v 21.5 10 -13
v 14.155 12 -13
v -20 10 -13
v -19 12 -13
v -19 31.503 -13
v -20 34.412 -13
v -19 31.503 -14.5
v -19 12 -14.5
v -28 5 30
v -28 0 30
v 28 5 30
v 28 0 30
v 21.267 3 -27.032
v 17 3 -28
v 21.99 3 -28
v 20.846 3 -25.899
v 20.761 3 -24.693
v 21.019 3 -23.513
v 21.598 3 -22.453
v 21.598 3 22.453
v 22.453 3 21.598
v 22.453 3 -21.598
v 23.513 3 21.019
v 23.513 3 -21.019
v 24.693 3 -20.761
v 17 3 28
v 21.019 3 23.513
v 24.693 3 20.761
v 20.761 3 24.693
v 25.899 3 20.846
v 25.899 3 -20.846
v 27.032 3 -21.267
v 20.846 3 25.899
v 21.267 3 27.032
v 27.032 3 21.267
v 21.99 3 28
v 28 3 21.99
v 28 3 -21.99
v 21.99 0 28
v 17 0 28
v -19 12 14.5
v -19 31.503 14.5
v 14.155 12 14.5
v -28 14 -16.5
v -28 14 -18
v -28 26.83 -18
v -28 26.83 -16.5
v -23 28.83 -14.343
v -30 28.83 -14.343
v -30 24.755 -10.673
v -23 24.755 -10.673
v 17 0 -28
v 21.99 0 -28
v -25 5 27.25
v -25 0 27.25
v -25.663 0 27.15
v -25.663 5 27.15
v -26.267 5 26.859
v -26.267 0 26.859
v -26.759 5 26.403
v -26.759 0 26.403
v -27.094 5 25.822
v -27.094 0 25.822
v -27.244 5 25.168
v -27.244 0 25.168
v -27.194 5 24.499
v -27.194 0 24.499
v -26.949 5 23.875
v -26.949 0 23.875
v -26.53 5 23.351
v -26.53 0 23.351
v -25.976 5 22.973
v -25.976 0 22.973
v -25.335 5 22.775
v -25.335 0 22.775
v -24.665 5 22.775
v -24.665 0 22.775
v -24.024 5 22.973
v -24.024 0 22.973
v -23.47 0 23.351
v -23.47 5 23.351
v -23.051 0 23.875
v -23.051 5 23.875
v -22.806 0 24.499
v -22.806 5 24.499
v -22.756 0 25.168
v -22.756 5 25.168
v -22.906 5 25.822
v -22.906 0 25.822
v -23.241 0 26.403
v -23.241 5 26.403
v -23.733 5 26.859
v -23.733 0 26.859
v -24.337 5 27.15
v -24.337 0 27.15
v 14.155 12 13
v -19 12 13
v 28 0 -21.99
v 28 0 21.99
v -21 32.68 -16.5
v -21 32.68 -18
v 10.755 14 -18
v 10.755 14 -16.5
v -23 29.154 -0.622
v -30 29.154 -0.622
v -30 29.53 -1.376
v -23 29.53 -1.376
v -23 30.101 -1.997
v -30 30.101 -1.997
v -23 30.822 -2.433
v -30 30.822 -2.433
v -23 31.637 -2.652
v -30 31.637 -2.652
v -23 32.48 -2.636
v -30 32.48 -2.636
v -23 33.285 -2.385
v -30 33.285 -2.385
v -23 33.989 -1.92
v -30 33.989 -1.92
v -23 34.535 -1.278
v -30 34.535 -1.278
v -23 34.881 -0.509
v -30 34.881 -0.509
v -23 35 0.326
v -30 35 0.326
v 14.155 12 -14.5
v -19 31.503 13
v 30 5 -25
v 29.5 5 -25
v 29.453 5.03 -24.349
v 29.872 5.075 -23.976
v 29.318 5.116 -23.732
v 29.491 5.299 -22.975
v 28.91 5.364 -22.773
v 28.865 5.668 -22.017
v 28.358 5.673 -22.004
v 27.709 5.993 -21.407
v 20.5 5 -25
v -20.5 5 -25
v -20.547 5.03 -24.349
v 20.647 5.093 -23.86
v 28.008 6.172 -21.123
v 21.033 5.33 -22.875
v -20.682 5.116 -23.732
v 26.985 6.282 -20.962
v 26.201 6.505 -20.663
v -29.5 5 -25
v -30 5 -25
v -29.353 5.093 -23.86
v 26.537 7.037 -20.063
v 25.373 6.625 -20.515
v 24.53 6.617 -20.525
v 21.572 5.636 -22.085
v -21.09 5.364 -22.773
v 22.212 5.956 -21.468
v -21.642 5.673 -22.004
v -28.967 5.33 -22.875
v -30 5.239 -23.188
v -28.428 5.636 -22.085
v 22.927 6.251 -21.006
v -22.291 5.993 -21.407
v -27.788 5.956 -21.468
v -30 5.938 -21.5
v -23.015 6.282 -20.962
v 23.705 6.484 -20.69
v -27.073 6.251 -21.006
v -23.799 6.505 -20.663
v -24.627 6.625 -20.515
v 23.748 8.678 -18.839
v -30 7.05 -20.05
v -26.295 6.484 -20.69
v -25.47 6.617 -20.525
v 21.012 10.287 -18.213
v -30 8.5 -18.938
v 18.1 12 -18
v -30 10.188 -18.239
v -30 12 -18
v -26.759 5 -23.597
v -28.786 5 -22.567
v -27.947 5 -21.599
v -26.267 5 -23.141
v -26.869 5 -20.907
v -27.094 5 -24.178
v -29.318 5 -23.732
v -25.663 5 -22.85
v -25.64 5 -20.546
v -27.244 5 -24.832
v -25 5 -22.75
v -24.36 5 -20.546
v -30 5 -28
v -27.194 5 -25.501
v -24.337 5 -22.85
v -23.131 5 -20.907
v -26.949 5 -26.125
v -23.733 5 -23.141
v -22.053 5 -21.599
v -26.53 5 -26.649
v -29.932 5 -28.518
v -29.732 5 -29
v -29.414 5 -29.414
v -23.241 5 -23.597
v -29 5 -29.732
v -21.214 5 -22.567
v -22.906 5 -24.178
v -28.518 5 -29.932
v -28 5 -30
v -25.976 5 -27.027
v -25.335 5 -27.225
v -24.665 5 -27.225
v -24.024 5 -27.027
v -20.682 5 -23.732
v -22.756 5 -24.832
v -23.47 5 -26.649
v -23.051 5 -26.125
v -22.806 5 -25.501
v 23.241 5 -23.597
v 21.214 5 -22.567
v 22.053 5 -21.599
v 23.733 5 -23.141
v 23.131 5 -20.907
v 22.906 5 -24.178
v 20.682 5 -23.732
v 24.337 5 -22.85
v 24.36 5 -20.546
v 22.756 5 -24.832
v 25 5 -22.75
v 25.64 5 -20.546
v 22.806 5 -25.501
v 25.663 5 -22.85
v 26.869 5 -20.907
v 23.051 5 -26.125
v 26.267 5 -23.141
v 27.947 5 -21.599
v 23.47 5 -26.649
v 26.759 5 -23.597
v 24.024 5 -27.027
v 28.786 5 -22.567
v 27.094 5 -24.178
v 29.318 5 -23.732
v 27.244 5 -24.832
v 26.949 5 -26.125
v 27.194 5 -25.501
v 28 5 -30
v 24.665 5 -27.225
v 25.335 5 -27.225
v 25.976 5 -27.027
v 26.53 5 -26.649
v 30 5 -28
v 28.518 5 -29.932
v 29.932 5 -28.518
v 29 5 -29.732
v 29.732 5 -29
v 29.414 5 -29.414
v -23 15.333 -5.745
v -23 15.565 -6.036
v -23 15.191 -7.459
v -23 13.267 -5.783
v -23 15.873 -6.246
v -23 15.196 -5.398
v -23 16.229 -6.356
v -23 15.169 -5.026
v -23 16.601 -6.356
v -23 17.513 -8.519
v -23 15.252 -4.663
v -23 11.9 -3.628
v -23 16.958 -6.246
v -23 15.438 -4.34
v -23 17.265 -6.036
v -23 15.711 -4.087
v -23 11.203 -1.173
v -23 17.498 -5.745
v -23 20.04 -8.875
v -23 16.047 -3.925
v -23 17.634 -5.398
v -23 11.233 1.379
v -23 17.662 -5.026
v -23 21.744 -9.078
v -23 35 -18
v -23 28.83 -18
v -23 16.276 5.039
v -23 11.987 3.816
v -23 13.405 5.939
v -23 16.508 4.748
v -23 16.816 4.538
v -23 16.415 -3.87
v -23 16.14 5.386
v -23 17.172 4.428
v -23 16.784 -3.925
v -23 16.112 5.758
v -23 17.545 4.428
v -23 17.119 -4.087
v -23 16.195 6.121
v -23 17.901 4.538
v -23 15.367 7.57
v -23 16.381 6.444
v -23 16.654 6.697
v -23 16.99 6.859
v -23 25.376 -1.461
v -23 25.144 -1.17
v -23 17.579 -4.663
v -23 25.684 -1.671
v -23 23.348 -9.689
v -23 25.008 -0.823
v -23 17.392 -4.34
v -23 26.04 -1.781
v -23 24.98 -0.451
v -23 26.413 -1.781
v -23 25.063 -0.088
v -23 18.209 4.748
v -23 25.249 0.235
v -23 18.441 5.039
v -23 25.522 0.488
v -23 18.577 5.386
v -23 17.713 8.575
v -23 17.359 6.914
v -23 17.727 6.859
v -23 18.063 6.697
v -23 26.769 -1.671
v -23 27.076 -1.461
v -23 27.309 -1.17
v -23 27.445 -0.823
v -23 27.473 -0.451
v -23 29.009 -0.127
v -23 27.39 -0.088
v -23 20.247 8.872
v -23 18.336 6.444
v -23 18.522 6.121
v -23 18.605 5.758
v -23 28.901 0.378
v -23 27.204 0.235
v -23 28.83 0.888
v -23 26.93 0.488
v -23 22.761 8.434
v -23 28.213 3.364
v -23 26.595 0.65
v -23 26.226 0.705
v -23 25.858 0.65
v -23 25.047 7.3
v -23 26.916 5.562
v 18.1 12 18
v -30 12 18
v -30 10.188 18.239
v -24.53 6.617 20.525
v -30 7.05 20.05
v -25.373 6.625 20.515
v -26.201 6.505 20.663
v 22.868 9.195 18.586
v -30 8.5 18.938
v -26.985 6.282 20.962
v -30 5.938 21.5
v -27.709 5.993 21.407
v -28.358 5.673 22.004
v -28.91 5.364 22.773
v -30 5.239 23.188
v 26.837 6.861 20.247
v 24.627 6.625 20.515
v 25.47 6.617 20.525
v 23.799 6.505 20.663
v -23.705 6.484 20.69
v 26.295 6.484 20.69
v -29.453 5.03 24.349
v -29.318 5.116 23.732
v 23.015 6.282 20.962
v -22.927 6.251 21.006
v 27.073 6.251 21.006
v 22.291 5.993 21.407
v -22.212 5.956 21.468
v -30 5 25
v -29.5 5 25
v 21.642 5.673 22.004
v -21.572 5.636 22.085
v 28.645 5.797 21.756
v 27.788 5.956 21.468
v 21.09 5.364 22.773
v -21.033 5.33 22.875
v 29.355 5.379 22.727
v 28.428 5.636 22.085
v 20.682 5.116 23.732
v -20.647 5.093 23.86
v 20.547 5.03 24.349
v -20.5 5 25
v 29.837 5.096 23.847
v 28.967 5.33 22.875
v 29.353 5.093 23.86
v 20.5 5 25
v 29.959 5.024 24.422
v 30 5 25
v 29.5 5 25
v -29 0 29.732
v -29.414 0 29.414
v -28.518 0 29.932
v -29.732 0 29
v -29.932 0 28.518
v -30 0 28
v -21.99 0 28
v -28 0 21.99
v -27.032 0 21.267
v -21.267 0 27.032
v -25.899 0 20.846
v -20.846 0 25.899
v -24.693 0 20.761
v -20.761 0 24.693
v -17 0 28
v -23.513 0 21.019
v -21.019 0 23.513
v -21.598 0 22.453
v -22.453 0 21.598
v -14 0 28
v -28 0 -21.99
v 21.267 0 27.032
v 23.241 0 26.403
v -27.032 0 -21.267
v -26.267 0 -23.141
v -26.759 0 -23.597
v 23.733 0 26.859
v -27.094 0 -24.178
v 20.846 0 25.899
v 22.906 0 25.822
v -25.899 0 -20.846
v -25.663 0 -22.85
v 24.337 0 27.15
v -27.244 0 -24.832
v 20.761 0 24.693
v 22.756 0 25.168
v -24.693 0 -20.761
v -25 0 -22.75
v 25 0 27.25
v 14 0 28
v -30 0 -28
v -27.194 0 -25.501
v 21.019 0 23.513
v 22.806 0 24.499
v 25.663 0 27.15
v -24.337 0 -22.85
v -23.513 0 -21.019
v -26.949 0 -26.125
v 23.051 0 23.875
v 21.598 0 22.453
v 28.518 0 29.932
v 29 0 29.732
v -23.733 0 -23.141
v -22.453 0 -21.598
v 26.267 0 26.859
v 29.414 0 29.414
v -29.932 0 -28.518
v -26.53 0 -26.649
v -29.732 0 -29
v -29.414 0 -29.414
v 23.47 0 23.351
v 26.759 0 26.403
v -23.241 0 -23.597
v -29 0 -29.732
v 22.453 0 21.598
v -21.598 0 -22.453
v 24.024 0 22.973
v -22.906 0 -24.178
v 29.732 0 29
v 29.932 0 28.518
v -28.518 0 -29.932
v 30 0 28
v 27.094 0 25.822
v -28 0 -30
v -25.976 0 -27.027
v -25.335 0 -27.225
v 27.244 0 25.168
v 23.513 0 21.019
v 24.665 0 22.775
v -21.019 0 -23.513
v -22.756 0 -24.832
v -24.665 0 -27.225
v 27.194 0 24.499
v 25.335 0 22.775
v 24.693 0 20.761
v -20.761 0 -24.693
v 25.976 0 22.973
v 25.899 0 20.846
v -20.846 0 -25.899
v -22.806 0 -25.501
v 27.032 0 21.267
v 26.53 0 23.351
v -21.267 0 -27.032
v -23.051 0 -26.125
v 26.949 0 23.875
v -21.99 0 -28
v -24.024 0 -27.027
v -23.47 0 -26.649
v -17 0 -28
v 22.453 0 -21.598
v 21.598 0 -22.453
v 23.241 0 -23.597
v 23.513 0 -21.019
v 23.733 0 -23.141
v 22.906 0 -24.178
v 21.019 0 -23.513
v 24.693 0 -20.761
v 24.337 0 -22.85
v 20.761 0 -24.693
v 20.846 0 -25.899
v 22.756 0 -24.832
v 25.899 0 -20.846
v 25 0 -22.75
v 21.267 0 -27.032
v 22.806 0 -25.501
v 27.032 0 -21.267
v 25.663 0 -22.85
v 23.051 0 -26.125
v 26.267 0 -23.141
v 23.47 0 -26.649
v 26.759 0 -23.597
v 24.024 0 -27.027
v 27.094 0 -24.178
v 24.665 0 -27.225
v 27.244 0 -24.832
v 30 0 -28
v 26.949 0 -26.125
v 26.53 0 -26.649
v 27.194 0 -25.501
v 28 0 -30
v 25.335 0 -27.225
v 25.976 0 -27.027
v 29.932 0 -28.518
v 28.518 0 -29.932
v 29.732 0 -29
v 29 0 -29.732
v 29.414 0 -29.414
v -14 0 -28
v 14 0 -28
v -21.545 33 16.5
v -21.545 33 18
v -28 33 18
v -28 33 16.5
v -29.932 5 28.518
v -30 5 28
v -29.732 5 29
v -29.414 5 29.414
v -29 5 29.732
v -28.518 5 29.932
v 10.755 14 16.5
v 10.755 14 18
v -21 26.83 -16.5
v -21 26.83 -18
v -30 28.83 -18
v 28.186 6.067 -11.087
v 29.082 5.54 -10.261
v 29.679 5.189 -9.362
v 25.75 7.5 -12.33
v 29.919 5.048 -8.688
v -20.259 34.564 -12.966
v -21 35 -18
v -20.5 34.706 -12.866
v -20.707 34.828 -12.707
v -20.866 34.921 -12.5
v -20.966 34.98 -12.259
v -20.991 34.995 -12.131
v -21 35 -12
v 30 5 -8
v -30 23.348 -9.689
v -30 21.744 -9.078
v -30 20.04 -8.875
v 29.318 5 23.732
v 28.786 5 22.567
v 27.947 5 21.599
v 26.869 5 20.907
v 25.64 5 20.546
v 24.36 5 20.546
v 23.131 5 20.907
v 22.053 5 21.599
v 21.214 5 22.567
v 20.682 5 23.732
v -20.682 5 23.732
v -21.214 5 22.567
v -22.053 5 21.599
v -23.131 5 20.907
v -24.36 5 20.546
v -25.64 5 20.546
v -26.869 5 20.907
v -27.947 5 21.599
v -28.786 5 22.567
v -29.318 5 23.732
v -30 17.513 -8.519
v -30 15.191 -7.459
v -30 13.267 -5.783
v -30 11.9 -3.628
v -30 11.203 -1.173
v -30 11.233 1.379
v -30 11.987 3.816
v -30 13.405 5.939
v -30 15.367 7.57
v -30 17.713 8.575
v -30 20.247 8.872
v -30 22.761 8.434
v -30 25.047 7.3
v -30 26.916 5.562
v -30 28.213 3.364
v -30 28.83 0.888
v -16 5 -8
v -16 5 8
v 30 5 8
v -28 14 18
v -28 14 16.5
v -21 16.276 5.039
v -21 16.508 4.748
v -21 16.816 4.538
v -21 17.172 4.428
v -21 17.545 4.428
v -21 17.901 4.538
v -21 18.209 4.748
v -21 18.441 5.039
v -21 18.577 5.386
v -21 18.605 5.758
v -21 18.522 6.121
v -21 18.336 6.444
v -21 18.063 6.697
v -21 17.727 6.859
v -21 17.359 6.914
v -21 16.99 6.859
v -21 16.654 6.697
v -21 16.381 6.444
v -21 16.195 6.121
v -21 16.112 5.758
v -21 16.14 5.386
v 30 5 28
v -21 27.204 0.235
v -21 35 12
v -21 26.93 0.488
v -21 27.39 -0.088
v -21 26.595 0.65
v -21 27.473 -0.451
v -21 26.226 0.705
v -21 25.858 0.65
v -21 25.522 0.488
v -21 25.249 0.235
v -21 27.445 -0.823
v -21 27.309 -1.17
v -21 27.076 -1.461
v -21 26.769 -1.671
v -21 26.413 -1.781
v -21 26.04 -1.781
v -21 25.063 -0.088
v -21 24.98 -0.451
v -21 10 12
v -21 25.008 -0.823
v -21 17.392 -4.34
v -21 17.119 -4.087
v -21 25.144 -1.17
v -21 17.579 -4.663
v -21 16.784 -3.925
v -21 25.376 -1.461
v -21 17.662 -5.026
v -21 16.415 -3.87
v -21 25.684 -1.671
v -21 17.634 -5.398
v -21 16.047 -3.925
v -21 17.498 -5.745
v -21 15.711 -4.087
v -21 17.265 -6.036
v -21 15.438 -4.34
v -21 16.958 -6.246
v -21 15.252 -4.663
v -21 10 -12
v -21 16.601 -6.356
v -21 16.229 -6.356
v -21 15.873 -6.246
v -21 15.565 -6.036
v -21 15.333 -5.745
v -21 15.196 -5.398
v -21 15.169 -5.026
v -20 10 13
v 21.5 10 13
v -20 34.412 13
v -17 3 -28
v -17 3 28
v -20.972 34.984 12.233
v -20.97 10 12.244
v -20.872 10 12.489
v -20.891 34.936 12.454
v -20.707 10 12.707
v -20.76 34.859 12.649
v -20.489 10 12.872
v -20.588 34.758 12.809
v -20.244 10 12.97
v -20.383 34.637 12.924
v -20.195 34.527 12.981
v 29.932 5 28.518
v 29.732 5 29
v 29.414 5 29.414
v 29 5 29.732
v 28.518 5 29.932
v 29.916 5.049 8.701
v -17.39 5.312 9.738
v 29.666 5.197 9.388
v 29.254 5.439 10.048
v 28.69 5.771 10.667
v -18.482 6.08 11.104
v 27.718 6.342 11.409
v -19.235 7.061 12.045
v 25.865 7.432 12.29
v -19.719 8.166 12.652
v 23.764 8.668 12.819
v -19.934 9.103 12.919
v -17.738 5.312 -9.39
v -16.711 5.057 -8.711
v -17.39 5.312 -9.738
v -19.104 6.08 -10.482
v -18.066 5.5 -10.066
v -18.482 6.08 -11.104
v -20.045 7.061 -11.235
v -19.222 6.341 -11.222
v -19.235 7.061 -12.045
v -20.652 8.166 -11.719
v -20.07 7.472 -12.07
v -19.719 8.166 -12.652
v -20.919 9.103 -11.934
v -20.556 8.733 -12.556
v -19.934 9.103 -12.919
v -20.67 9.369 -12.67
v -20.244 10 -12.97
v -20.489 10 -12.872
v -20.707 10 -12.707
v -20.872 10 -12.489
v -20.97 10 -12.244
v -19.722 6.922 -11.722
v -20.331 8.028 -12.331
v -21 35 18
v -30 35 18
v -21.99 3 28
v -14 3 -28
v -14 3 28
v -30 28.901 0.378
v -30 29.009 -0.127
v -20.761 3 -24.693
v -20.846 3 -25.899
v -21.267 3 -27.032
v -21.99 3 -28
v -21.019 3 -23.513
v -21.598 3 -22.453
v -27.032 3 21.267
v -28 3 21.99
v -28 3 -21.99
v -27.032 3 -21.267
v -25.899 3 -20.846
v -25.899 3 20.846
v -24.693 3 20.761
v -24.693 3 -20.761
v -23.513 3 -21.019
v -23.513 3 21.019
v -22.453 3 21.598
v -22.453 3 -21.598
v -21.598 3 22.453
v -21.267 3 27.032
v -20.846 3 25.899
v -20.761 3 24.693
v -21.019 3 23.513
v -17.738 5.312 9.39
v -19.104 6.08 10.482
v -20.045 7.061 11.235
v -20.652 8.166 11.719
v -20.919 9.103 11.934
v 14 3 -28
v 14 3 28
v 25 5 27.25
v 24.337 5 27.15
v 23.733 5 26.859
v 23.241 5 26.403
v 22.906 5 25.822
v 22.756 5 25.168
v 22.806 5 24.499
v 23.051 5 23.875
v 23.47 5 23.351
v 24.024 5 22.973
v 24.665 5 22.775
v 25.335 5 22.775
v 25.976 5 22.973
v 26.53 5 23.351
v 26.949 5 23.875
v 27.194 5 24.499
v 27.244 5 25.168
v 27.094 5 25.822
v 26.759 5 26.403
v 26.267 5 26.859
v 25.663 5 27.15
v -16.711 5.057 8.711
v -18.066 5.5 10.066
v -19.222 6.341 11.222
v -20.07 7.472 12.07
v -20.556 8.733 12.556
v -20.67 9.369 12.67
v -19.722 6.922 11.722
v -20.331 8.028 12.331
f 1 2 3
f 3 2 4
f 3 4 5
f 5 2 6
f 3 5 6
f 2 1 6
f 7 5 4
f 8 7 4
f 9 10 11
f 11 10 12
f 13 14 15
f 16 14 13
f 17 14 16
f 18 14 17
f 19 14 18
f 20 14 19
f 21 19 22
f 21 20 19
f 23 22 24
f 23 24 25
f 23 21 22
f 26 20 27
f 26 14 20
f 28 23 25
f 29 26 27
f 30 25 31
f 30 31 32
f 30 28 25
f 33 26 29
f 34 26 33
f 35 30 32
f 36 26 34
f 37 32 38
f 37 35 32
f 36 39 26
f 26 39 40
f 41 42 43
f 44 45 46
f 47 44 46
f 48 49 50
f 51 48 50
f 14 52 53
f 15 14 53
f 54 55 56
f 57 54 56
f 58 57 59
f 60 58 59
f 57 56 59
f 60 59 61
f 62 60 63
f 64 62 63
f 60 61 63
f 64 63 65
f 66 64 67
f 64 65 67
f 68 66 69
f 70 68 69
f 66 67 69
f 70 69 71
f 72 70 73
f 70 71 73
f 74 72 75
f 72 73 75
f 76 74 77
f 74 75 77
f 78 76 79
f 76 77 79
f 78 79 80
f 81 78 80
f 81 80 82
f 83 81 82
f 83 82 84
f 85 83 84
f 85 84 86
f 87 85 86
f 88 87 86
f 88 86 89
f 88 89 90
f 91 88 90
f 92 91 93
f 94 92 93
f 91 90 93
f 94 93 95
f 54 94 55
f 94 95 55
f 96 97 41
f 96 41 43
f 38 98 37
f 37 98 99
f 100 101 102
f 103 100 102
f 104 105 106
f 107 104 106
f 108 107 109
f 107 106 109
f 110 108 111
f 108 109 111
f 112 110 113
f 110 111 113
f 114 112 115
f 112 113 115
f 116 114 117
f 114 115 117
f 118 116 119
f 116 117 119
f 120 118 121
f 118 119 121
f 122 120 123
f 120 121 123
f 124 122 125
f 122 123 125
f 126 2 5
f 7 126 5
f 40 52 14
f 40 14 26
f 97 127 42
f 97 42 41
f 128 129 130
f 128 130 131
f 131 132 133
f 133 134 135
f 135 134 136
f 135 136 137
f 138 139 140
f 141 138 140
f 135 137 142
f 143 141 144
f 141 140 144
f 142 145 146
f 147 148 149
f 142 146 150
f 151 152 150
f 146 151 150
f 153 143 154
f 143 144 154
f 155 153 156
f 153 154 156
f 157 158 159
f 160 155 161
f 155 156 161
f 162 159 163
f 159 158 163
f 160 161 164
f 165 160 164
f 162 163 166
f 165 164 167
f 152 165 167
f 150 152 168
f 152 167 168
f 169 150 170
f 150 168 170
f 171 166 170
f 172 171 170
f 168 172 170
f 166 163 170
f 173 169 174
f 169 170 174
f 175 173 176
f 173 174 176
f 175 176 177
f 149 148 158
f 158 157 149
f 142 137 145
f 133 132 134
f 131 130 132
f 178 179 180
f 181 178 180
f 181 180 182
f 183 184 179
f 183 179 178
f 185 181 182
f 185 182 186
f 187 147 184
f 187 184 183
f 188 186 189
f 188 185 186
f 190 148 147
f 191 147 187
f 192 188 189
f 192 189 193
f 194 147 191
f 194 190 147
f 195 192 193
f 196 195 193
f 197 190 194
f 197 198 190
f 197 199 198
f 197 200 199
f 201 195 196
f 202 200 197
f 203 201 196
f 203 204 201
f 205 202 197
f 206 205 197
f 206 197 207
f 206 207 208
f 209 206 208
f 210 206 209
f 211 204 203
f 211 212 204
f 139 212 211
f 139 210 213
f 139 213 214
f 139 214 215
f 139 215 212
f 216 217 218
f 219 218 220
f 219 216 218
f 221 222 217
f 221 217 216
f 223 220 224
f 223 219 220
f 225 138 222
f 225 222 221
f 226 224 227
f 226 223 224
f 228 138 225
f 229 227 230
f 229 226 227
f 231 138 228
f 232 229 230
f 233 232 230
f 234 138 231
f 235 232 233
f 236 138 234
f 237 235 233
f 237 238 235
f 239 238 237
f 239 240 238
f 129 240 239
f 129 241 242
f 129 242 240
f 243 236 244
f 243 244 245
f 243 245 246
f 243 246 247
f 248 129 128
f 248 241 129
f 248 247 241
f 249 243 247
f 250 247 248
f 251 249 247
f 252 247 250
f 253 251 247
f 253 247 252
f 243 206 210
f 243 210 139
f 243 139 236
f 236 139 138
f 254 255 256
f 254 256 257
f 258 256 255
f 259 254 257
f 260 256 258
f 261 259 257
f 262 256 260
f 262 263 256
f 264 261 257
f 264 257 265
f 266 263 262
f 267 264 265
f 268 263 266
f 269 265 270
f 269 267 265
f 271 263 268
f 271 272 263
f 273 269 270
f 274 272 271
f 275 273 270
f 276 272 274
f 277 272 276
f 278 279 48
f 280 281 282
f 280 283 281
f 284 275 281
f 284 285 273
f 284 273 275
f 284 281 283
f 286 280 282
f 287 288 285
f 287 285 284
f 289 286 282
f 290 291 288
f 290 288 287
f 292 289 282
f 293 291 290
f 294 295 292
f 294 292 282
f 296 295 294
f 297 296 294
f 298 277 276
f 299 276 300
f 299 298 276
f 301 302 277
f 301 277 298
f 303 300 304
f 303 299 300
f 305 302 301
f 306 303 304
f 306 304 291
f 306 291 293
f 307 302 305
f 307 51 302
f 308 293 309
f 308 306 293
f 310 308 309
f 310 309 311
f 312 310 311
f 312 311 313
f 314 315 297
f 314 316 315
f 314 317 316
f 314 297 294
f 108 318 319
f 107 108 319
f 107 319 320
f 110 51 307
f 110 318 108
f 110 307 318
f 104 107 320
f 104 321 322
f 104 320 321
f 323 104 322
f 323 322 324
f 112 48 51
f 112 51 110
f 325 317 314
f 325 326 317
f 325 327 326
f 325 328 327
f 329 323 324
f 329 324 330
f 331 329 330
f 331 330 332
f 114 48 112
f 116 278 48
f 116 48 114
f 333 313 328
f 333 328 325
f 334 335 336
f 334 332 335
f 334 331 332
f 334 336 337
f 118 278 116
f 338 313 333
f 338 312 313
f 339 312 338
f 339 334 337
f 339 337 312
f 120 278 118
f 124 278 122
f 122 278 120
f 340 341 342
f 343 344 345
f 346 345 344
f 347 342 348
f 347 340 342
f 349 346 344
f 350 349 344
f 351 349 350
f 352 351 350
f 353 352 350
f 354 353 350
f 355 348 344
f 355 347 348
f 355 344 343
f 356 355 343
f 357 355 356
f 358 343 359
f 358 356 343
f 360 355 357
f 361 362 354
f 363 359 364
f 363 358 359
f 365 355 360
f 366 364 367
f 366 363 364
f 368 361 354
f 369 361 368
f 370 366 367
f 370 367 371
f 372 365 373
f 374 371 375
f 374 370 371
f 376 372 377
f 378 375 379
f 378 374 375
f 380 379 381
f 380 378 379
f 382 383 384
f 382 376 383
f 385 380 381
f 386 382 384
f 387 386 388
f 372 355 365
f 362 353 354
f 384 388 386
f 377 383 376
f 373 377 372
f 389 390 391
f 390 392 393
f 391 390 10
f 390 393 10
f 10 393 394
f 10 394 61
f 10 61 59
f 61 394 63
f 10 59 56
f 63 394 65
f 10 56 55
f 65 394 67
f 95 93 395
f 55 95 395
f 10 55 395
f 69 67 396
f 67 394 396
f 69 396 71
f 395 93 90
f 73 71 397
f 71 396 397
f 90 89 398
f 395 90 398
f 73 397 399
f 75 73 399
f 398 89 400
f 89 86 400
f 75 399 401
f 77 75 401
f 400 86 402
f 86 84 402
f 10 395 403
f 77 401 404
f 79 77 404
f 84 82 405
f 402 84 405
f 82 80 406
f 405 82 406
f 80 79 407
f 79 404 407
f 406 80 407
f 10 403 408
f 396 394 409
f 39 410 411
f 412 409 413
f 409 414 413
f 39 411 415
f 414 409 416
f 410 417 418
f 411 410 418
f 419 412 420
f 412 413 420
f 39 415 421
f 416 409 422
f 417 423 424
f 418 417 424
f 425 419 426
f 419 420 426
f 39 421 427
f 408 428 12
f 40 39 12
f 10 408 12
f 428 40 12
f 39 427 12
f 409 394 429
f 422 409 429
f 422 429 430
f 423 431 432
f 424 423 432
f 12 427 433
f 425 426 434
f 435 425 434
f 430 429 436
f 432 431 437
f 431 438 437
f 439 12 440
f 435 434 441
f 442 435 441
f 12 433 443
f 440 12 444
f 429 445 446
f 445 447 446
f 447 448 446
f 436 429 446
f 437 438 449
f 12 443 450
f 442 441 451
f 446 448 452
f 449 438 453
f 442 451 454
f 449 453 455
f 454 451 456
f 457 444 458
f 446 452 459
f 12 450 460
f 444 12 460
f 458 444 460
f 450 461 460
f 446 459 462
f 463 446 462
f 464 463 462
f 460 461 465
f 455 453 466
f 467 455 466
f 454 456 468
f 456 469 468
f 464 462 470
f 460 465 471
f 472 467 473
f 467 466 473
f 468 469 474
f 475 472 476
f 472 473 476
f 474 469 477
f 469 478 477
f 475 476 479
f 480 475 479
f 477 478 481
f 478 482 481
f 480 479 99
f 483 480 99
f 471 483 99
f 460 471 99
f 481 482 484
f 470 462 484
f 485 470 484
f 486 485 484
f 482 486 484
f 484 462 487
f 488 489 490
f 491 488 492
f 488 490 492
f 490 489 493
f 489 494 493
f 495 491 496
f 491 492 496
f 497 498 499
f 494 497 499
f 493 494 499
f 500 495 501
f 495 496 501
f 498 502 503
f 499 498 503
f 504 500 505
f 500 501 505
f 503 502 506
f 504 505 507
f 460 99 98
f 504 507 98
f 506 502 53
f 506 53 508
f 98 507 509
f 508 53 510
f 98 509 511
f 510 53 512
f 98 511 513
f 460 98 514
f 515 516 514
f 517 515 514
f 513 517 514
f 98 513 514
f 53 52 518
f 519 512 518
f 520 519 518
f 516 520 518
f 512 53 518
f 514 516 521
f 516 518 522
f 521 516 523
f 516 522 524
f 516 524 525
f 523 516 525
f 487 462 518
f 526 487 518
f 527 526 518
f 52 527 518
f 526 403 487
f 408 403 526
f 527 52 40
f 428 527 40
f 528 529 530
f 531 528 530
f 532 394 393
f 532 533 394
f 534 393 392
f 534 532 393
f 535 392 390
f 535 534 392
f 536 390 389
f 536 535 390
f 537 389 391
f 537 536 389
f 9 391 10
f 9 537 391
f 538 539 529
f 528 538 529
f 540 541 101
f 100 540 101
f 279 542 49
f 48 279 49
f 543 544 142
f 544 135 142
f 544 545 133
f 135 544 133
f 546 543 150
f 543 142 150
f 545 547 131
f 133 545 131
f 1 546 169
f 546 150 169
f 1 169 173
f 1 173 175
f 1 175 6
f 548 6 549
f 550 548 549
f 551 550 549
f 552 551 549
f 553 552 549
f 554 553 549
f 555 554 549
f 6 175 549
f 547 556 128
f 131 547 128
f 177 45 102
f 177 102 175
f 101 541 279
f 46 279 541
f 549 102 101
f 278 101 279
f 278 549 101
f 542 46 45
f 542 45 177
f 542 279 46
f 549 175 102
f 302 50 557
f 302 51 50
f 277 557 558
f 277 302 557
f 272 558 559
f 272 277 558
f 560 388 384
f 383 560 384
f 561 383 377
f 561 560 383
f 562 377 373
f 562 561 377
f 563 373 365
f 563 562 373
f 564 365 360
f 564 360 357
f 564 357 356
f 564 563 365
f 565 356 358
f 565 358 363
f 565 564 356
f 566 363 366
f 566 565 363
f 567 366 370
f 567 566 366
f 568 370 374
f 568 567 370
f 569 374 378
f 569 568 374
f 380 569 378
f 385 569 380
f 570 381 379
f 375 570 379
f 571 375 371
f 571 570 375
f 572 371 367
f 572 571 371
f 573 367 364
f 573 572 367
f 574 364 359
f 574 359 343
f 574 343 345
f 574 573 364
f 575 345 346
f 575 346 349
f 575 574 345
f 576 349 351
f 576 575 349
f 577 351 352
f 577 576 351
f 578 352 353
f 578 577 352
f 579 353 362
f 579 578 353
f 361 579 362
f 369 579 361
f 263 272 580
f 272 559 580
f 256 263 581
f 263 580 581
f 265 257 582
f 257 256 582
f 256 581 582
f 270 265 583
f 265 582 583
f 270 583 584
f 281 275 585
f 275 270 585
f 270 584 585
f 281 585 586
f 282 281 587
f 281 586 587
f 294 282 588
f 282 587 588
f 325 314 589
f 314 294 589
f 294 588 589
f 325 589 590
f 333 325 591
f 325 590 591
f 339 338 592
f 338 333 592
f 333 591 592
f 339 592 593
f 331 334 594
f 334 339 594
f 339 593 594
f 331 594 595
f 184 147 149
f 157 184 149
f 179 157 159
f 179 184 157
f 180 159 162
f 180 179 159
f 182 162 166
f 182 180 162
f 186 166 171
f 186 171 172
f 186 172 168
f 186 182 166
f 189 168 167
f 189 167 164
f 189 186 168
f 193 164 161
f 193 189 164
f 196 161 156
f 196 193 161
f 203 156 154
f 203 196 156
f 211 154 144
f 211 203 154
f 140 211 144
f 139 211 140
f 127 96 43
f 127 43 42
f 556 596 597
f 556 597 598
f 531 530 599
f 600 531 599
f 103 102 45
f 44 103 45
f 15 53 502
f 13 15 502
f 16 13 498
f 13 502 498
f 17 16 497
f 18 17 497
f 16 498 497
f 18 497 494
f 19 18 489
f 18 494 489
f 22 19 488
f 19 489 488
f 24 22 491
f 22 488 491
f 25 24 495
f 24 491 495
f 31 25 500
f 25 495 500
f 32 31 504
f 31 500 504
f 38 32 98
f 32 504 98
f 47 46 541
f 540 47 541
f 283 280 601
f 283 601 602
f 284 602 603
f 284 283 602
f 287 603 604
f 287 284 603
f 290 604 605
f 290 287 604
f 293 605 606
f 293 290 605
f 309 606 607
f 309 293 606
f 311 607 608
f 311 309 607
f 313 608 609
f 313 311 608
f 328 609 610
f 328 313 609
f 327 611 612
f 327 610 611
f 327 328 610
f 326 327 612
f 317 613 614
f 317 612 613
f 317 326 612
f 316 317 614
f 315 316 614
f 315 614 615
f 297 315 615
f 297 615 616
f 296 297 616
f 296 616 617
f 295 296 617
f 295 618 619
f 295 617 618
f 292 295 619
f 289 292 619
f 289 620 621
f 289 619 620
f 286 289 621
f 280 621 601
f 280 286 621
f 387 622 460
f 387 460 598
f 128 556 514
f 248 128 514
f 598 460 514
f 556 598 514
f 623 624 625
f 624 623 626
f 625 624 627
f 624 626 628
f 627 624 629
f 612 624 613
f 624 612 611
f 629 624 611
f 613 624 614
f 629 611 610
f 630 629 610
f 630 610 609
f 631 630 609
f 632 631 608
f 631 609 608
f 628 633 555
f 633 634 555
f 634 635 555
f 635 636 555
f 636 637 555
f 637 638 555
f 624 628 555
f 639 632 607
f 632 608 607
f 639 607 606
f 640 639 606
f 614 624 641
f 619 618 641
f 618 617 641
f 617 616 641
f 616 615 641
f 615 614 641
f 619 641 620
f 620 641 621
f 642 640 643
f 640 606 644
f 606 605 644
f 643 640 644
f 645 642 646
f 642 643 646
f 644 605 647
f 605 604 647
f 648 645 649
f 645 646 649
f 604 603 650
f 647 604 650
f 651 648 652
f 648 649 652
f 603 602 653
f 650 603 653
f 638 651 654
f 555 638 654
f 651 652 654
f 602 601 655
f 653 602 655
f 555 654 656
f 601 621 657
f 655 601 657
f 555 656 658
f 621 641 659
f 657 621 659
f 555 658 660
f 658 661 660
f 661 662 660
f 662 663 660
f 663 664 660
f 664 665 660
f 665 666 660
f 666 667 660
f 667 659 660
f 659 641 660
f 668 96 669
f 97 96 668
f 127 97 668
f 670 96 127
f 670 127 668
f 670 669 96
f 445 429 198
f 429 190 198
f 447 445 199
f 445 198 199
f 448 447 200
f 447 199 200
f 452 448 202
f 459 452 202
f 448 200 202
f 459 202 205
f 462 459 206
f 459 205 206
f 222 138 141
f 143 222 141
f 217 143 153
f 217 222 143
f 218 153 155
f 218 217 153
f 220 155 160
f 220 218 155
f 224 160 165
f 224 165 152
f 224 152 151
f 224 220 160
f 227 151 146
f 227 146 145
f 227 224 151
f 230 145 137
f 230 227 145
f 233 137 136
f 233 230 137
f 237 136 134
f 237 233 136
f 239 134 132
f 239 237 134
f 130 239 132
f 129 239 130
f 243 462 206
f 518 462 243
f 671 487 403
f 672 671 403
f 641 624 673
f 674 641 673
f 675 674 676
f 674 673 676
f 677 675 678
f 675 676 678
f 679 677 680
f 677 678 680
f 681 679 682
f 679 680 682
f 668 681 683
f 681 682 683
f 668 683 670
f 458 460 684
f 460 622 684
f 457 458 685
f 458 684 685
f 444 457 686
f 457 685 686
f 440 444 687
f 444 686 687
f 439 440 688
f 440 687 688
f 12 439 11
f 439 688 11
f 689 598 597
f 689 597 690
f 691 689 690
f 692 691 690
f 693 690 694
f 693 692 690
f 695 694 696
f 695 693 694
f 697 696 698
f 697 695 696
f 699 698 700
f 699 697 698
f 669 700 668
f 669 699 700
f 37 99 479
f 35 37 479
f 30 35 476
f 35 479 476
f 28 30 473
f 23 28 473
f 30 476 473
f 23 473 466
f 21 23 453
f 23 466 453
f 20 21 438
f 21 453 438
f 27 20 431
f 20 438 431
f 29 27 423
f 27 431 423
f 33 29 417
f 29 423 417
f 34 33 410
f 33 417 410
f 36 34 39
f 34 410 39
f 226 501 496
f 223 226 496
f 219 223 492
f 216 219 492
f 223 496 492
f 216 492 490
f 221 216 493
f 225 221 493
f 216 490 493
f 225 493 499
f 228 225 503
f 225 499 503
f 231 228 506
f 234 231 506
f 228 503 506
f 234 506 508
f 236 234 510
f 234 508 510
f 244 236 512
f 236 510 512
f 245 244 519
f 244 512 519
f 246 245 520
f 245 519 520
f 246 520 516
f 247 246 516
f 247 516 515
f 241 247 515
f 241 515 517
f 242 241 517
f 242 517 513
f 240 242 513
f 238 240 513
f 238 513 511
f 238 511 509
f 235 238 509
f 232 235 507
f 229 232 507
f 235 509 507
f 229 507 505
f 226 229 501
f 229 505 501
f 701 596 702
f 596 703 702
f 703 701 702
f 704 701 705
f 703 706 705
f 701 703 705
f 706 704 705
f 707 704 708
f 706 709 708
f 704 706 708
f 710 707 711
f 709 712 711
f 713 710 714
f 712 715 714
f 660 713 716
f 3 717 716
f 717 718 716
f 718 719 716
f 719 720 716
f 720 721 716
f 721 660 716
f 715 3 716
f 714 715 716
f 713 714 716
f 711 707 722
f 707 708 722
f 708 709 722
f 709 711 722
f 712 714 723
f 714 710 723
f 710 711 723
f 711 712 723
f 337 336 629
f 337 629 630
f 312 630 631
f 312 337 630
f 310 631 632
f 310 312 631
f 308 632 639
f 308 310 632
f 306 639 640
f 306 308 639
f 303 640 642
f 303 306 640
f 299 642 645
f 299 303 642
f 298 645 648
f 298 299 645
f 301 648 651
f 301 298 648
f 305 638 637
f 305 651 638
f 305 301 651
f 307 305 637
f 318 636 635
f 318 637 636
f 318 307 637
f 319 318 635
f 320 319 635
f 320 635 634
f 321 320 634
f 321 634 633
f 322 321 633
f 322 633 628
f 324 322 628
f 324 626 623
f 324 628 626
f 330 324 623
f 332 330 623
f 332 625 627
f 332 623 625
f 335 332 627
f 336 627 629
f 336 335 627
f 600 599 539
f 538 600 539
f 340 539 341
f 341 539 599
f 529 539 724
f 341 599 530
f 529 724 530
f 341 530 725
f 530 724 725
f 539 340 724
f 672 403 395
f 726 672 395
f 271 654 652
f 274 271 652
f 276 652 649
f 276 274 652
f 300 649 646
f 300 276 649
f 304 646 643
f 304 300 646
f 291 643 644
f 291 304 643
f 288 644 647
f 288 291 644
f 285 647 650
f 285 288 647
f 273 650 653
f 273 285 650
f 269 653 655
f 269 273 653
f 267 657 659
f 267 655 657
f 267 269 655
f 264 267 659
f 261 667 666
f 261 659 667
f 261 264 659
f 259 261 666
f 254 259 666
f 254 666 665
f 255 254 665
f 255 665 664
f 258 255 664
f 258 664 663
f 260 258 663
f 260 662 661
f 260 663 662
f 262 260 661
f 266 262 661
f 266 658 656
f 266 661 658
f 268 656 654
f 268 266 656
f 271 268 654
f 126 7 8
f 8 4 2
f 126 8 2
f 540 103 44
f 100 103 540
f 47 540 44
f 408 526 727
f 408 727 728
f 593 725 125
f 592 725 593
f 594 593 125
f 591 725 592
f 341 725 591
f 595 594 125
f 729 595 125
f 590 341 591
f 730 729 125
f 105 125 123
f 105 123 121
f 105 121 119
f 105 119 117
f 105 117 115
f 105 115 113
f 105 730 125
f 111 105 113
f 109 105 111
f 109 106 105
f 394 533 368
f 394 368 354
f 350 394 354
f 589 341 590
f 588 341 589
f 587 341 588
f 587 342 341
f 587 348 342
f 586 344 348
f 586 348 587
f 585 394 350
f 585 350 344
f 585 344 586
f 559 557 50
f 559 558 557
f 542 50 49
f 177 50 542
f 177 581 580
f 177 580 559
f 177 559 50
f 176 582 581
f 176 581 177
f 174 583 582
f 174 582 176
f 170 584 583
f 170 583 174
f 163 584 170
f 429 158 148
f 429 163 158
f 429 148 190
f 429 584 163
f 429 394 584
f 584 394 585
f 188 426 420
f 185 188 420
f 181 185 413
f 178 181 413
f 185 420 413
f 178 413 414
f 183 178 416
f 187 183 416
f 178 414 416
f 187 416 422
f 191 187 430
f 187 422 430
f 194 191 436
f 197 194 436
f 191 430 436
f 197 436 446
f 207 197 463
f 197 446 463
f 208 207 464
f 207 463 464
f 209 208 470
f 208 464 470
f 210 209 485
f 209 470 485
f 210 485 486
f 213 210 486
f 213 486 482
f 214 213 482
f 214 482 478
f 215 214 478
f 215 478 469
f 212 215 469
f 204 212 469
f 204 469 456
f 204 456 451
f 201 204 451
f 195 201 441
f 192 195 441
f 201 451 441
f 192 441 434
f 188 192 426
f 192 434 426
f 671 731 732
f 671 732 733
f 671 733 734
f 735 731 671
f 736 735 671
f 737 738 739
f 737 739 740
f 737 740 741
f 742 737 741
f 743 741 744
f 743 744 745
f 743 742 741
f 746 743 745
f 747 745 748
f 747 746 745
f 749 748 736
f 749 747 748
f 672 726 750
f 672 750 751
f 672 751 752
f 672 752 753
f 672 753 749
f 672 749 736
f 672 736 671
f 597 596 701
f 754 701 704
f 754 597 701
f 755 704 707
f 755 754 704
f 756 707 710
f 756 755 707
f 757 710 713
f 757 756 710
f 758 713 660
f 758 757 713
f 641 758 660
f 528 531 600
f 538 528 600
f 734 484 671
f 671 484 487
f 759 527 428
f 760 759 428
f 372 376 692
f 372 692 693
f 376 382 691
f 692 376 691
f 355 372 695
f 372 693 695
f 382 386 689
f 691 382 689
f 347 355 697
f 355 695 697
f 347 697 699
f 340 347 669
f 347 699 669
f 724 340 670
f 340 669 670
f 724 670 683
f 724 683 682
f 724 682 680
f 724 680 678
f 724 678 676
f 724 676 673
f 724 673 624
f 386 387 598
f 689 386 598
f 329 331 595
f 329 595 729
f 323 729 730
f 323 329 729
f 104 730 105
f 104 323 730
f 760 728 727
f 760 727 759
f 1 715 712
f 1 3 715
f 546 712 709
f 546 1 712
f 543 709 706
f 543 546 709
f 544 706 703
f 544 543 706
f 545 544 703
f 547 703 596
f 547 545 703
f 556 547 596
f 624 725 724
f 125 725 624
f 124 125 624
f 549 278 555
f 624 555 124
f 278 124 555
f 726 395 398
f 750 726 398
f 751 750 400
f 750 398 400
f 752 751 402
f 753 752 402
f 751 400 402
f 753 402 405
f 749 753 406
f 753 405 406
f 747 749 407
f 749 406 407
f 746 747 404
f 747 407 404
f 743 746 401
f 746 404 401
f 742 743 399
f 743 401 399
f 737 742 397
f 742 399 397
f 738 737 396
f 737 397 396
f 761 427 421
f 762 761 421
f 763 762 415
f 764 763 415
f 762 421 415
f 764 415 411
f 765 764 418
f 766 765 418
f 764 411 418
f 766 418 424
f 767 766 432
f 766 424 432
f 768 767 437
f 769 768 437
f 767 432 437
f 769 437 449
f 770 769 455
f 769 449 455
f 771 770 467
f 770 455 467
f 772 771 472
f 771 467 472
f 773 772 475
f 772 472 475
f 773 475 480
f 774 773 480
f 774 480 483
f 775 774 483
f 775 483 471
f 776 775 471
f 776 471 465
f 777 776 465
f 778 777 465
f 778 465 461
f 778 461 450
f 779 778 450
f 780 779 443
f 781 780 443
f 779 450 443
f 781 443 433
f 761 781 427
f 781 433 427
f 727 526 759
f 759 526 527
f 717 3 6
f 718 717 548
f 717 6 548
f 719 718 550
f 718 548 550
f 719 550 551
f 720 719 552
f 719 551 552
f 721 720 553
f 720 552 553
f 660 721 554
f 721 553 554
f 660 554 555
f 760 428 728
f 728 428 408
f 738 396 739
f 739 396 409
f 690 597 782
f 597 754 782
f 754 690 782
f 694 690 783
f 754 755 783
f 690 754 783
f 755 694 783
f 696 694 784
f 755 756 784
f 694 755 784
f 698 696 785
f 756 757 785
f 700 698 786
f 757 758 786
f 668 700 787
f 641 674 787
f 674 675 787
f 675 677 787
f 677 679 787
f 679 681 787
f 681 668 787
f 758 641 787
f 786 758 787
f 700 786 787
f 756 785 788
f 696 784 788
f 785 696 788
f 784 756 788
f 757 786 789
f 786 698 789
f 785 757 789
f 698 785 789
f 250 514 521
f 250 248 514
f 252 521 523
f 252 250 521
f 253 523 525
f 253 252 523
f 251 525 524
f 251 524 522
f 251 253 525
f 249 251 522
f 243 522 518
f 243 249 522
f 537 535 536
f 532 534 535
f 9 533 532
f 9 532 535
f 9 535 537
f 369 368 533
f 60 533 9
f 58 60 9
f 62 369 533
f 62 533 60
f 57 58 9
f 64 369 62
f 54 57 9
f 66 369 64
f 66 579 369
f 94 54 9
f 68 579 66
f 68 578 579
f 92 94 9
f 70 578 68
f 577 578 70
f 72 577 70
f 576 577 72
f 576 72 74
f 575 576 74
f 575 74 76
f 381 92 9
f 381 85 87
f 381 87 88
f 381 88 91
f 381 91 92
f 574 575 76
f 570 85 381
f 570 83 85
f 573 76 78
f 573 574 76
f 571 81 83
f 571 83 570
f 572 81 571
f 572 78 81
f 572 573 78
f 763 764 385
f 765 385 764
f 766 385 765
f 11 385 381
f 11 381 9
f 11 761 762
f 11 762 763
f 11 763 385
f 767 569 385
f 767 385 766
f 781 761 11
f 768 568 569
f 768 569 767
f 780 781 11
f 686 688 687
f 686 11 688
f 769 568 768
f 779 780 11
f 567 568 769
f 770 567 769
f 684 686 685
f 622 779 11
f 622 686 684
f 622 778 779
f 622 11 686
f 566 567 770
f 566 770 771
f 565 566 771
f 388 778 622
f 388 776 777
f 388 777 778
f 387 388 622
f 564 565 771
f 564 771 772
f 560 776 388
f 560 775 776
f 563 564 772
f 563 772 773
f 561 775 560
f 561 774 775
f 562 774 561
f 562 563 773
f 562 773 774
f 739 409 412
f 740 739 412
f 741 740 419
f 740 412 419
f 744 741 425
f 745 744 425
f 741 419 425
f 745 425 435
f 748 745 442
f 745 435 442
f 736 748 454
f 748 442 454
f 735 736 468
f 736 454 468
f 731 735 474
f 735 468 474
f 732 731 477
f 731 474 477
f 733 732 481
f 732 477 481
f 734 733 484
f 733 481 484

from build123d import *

# Parameters (mm, degrees)
SKETCH2_W                     = 60
SKETCH2_H                     = 60
BOSS_EXTRUDE1_DEPTH           = 5
SKETCH5_W                     = 9
SKETCH5_H                     = 36
BOSS_EXTRUDE2_DEPTH           = 30
BOSS_EXTRUDE3_DEPTH           = 5
BOSS_EXTRUDE4_DEPTH           = 5
FILLET6_R                     = 7
SKETCH4_W                     = 2.25
SKETCH4_H                     = 5
M4_CLEARANCE_HOLE2_AT_2_COUNT = 2
M4_CLEARANCE_HOLE2_AT_2_PITCH = 70.710678119
M4_CLEARANCE_HOLE2_AT_3_COUNT = 2
M4_CLEARANCE_HOLE2_AT_3_PITCH = 50
M4_CLEARANCE_HOLE2_AT_4_COUNT = 2
M4_CLEARANCE_HOLE2_AT_4_PITCH = 50
SKETCH17_R                    = 4.5
CUT_EXTRUDE7_DEPTH            = 5
CUT_EXTRUDE8_DEPTH            = 3
RIB9_REACH                    = 57
SKETCH19_WALLS_W              = 3
SKETCH19_WALLS_H              = 168.00000011
FILLET7_R                     = 5
CUT_EXTRUDE10_DEPTH           = 1.5
FILLET8_R                     = 1
SKETCH23_R                    = 1.25
CUT_EXTRUDE12_DEPTH           = 76.663729878
CIRPATTERN2_COUNT             = 3
FILLET10_R                    = 2
SKETCH24_R                    = 8.875
CUT_EXTRUDE13_DEPTH           = 7
CUT_EXTRUDE14_DEPTH           = 7
FILLET11_R                    = 7
SKETCH27_W                    = 5
SKETCH27_H                    = 6.169574238
CUT_EXTRUDE17_DEPTH           = 7
CUT_EXTRUDE18_DEPTH           = 1.5
CUT_EXTRUDE19_DEPTH           = 1.5
FILLET13_R                    = 3


with BuildPart() as part:
    # Sketch2 → Boss-Extrude1 (new body)
    with BuildSketch(Plane(origin=(0, 0, 0), x_dir=(1, 0, 0), z_dir=(0, 1, 0))):
        Rectangle(SKETCH2_W, SKETCH2_H)
    extrude(amount=BOSS_EXTRUDE1_DEPTH)

    # Sketch5 → Boss-Extrude2 (add)
    with BuildSketch(Plane(origin=(0, 5, 0), x_dir=(1, 0, 0), z_dir=(0, 1, 0))):
        with Locations((-25.5, 0)):
            Rectangle(SKETCH5_W, SKETCH5_H)
    extrude(amount=BOSS_EXTRUDE2_DEPTH)

    # Sketch6 → Boss-Extrude3 (add)
    with BuildSketch(Plane.XY.offset(18)):
        Polygon((-21, 35), (30, 5), (-21, 5), align=None)
    extrude(amount=-BOSS_EXTRUDE3_DEPTH)

    # Sketch15 → Boss-Extrude4 (add)
    with BuildSketch(Plane(origin=(0, 0, -18), x_dir=(-1, 0, 0), z_dir=(0, 0, -1))):
        Polygon((21, 5), (21, 35), (-30, 5), align=None)
    extrude(amount=-BOSS_EXTRUDE4_DEPTH)

    # Fillet6
    fillet6_edges = [part.edges().sort_by_distance(p)[0] for p in [
        (0, 5, 18),
        (0, 5, -18),
    ]]
    fillet(fillet6_edges, radius=FILLET6_R)

    # Sketch4 → M4 Clearance Hole2 (revolve, cut)
    with BuildSketch(Plane(origin=(25, 5, -25), x_dir=(0, 0, 1), z_dir=(1, 0, 0))):
        with Locations((1.125, 2.5)):
            Rectangle(SKETCH4_W, SKETCH4_H)
    m4_clearance_hole2 = revolve(axis=Axis((25, 11.35, -25), (0, -1, 0)), mode=Mode.SUBTRACT)

    # M4 Clearance Hole2 at 2: M4 Clearance Hole2 ×2
    with Locations(*[Vector(-0.7071067811865476, 0, 0.7071067811865476) * (i * M4_CLEARANCE_HOLE2_AT_2_PITCH) for i in range(1, M4_CLEARANCE_HOLE2_AT_2_COUNT)]):
        add(m4_clearance_hole2, mode=Mode.SUBTRACT)

    # M4 Clearance Hole2 at 3: M4 Clearance Hole2 ×2
    with Locations(*[(-i * M4_CLEARANCE_HOLE2_AT_3_PITCH, 0, 0) for i in range(1, M4_CLEARANCE_HOLE2_AT_3_COUNT)]):
        add(m4_clearance_hole2, mode=Mode.SUBTRACT)

    # M4 Clearance Hole2 at 4: M4 Clearance Hole2 ×2
    with Locations(*[(0, 0, i * M4_CLEARANCE_HOLE2_AT_4_PITCH) for i in range(1, M4_CLEARANCE_HOLE2_AT_4_COUNT)]):
        add(m4_clearance_hole2, mode=Mode.SUBTRACT)

    # Sketch17 → Cut-Extrude7 (cut)
    with BuildSketch(Plane(origin=(0, 5, 0), x_dir=(1, 0, 0), z_dir=(0, 1, 0))):
        with Locations((25, -25)):
            Circle(SKETCH17_R)
        with Locations((-25, -25)):
            Circle(SKETCH17_R)
        with Locations((-25, 25)):
            Circle(SKETCH17_R)
        with Locations((25, 25)):
            Circle(SKETCH17_R)
    extrude(amount=CUT_EXTRUDE7_DEPTH, mode=Mode.SUBTRACT)

    # Sketch18 → Cut-Extrude8 (cut)
    with BuildSketch(Plane.XZ):
        with BuildLine():
            Line((-28, 21.989601355), (-28, -21.989601355))
            ThreePointArc((-28, -21.989601355), (-21.99479618, -21.99479618), (-21.989601355, -28))
            Line((-21.989601355, -28), (21.989601355, -28))
            ThreePointArc((21.989601355, -28), (21.99479618, -21.99479618), (28, -21.989601355))
            Line((28, -21.989601355), (28, 21.989601355))
            ThreePointArc((28, 21.989601355), (21.99479618, 21.99479618), (21.989601355, 28))
            Line((21.989601355, 28), (-21.989601355, 28))
            ThreePointArc((-21.989601355, 28), (-21.99479618, 21.99479618), (-28, 21.989601355))
        make_face()
    extrude(amount=-CUT_EXTRUDE8_DEPTH, mode=Mode.SUBTRACT)

    # Sketch19 walls → Rib9 (add, up to next)
    with BuildSketch(Plane.XZ, mode=Mode.PRIVATE) as rib9_sk1:
        with Locations((15.5, 0)):
            Rectangle(SKETCH19_WALLS_W, SKETCH19_WALLS_H)
    rib9_tool1 = extrude(rib9_sk1.sketch, amount=-RIB9_REACH, mode=Mode.PRIVATE) - part.part
    # Sketch19 walls → Rib9 (add, up to next)
    with BuildSketch(Plane.XZ, mode=Mode.PRIVATE) as rib9_sk2:
        with Locations((-15.5, 0)):
            Rectangle(SKETCH19_WALLS_W, SKETCH19_WALLS_H)
    rib9_tool2 = extrude(rib9_sk2.sketch, amount=-RIB9_REACH, mode=Mode.PRIVATE) - part.part
    add(rib9_tool1.solids().sort_by_distance((15.5, 0, 0))[0])
    add(rib9_tool2.solids().sort_by_distance((-15.5, 0, 0))[0])

    # Fillet7
    # the kernel refuses this fillet: 5 mm, written as the material it adds along each edge
    with BuildSketch(Plane(origin=(-21, 5, 13), x_dir=(1, 0, 0), z_dir=(0, 0, -1))) as fillet7_piece_1:
        with BuildLine():
            CenterArc((FILLET7_R, -FILLET7_R), FILLET7_R, 90, 90)
            Line((0, -FILLET7_R), (0, 0))
            Line((0, 0), (FILLET7_R, 0))
        make_face()
    extrude(amount=26)
    with BuildSketch(Plane(origin=(42.5, 5, 13), x_dir=(0, 0, -1), z_dir=(-1, 0, 0))) as fillet7_piece_2_section:
        with BuildLine():
            CenterArc((FILLET7_R, -FILLET7_R), FILLET7_R, 90, 90)
            Line((0, -FILLET7_R), (0, 0))
            Line((0, 0), (FILLET7_R, 0))
        make_face()
    fillet7_piece_2 = extrude(amount=63.5, mode=Mode.PRIVATE)
    fillet7_piece_2 = split(fillet7_piece_2, bisect_by=Plane(origin=(9.894433322, 16.826803928, 11.865257735), z_dir=(-0.5070201265633938, -0.8619342151577696, 0)), keep=Keep.TOP, mode=Mode.PRIVATE)
    add(fillet7_piece_2)
    with BuildSketch(Plane(origin=(42.5, 5, -13), x_dir=(0, 0, 1), z_dir=(-1, 0, 0))) as fillet7_piece_3_section:
        with BuildLine():
            CenterArc((FILLET7_R, FILLET7_R), FILLET7_R, 180, 90)
            Line((0, FILLET7_R), (0, 0))
            Line((0, 0), (FILLET7_R, 0))
        make_face()
    fillet7_piece_3 = extrude(amount=63.5, mode=Mode.PRIVATE)
    fillet7_piece_3 = split(fillet7_piece_3, bisect_by=Plane(origin=(9.894433322, 16.826803928, -11.865257735), z_dir=(-0.5070201265633937, -0.8619342151577696, 0)), keep=Keep.TOP, mode=Mode.PRIVATE)
    add(fillet7_piece_3)

    # Sketch21 → Cut-Extrude10 (cut)
    with BuildSketch(Plane.XY.offset(-13)):
        Polygon((-19, 31.503166715), (-19, 12), (14.155383415, 12), align=None)
    cut_extrude10 = extrude(amount=-CUT_EXTRUDE10_DEPTH, mode=Mode.SUBTRACT)

    # Fillet8
    fillet8_edges = [part.edges().sort_by_distance(p)[0] for p in [
        (-21, 22.5, 13),
        (-21, 22.5, -13),
        (-19.230244537, 6.183519916, 11.230244537),
        (-19.230244537, 6.183519916, -11.230244537),
    ]]
    fillet(fillet8_edges, radius=FILLET8_R)

    # Mirror3: Cut-Extrude10 across plane
    add(cut_extrude10.mirror(Plane.XY), mode=Mode.SUBTRACT)

    # Sketch23 → Cut-Extrude12 (cut, through all)
    with BuildSketch(Plane(origin=(-30, 0, 0), x_dir=(0, 0, -1), z_dir=(1, 0, 0))):
        with Locations(Location((0.544723392, 26.226216863, 0), (0, 0, 180))):
            Circle(SKETCH23_R)
    cut_extrude12 = extrude(amount=CUT_EXTRUDE12_DEPTH, mode=Mode.SUBTRACT)

    # CirPattern2: Cut-Extrude12 ×3 about axis
    cirpattern2_axis = Axis((0, 20, 0), (1, 0, 0))
    for i in range(1, CIRPATTERN2_COUNT):
        add(cut_extrude12.rotate(cirpattern2_axis, i * 360 / CIRPATTERN2_COUNT), mode=Mode.SUBTRACT)

    # Fillet10
    fillet10_edges = [part.edges().sort_by_distance(p)[0] for p in [
        (-30, 2.5, -30),
        (-30, 2.5, 30),
        (30, 2.5, 30),
        (30, 2.5, -30),
    ]]
    fillet(fillet10_edges, radius=FILLET10_R)

    # Sketch24 → Cut-Extrude13 (cut)
    with BuildSketch(Plane.ZY.offset(30)):
        with Locations((0, 20)):
            Circle(SKETCH24_R)
    extrude(amount=-CUT_EXTRUDE13_DEPTH, mode=Mode.SUBTRACT)

    # Sketch25 → Cut-Extrude14 (cut)
    with BuildSketch(Plane.ZY.offset(30)):
        Polygon((-1.486450158, 28.74963376), (-10.151392059, 38.373026676), (-17.792172557, 39.760209508), (-17.211267901, 32.016285915), (-8.546326, 22.392892999), align=None)
    extrude(amount=-CUT_EXTRUDE14_DEPTH, mode=Mode.SUBTRACT)

    # Fillet11
    fillet11_edges = [part.edges().sort_by_distance(p)[0] for p in [
        (-26.5, 28.74963376, -1.486450158),
        (-26.5, 22.392892999, -8.546326),
    ]]
    fillet(fillet11_edges, radius=FILLET11_R)

    # Sketch27 → Cut-Extrude17 (cut)
    with BuildSketch(Plane.ZY.offset(30)):
        with Locations((-15.5, 31.915212881)):
            Rectangle(SKETCH27_W, SKETCH27_H)
    extrude(amount=-CUT_EXTRUDE17_DEPTH, mode=Mode.SUBTRACT)

    # Sketch28 → Cut-Extrude18 (cut)
    with BuildSketch(Plane(origin=(0, 0, -18), x_dir=(-1, 0, 0), z_dir=(0, 0, -1))):
        Polygon((28, 14), (28, 26.830425762), (21, 26.830425762), (21, 32.679637303), (-10.755383415, 14), align=None)
    extrude(amount=-CUT_EXTRUDE18_DEPTH, mode=Mode.SUBTRACT)

    # Sketch29 → Cut-Extrude19 (cut)
    with BuildSketch(Plane.XY.offset(18)):
        Polygon((10.755383415, 14), (-21.544616585, 33), (-28, 33), (-28, 14), align=None)
    extrude(amount=-CUT_EXTRUDE19_DEPTH, mode=Mode.SUBTRACT)

    # Fillet13
    # the kernel refuses this fillet: 3 mm, written as the material it takes off along each edge
    with BuildSketch(Plane(origin=(-51.842425733, 35, -7.114305199), x_dir=(0, -0.6691623373486353, 0.7431162535391829), z_dir=(1, 0, 0))) as fillet13_piece_1:
        with BuildLine():
            CenterArc((7.536318289, -2.749260767), FILLET13_R, 66.408234173, 161.58931935)
            Line((5.528831277, -4.978609528), (5.328082575, -5.201544404))
            Line((5.328082575, -5.201544404), (-0.200748701, -0.222934876))
            Line((-0.200748701, -0.222934876), (-0.031345799, 0.298357907))
            ThreePointArc((-0.031345799, 0.298357907), (5.172701164, 0.845100622), (8.857035494, 0.274926077))
            Line((8.857035494, 0.274926077), (8.736970293, 0))
        make_face()
    extrude(amount=28.842425733, mode=Mode.SUBTRACT)


solid = part.part
